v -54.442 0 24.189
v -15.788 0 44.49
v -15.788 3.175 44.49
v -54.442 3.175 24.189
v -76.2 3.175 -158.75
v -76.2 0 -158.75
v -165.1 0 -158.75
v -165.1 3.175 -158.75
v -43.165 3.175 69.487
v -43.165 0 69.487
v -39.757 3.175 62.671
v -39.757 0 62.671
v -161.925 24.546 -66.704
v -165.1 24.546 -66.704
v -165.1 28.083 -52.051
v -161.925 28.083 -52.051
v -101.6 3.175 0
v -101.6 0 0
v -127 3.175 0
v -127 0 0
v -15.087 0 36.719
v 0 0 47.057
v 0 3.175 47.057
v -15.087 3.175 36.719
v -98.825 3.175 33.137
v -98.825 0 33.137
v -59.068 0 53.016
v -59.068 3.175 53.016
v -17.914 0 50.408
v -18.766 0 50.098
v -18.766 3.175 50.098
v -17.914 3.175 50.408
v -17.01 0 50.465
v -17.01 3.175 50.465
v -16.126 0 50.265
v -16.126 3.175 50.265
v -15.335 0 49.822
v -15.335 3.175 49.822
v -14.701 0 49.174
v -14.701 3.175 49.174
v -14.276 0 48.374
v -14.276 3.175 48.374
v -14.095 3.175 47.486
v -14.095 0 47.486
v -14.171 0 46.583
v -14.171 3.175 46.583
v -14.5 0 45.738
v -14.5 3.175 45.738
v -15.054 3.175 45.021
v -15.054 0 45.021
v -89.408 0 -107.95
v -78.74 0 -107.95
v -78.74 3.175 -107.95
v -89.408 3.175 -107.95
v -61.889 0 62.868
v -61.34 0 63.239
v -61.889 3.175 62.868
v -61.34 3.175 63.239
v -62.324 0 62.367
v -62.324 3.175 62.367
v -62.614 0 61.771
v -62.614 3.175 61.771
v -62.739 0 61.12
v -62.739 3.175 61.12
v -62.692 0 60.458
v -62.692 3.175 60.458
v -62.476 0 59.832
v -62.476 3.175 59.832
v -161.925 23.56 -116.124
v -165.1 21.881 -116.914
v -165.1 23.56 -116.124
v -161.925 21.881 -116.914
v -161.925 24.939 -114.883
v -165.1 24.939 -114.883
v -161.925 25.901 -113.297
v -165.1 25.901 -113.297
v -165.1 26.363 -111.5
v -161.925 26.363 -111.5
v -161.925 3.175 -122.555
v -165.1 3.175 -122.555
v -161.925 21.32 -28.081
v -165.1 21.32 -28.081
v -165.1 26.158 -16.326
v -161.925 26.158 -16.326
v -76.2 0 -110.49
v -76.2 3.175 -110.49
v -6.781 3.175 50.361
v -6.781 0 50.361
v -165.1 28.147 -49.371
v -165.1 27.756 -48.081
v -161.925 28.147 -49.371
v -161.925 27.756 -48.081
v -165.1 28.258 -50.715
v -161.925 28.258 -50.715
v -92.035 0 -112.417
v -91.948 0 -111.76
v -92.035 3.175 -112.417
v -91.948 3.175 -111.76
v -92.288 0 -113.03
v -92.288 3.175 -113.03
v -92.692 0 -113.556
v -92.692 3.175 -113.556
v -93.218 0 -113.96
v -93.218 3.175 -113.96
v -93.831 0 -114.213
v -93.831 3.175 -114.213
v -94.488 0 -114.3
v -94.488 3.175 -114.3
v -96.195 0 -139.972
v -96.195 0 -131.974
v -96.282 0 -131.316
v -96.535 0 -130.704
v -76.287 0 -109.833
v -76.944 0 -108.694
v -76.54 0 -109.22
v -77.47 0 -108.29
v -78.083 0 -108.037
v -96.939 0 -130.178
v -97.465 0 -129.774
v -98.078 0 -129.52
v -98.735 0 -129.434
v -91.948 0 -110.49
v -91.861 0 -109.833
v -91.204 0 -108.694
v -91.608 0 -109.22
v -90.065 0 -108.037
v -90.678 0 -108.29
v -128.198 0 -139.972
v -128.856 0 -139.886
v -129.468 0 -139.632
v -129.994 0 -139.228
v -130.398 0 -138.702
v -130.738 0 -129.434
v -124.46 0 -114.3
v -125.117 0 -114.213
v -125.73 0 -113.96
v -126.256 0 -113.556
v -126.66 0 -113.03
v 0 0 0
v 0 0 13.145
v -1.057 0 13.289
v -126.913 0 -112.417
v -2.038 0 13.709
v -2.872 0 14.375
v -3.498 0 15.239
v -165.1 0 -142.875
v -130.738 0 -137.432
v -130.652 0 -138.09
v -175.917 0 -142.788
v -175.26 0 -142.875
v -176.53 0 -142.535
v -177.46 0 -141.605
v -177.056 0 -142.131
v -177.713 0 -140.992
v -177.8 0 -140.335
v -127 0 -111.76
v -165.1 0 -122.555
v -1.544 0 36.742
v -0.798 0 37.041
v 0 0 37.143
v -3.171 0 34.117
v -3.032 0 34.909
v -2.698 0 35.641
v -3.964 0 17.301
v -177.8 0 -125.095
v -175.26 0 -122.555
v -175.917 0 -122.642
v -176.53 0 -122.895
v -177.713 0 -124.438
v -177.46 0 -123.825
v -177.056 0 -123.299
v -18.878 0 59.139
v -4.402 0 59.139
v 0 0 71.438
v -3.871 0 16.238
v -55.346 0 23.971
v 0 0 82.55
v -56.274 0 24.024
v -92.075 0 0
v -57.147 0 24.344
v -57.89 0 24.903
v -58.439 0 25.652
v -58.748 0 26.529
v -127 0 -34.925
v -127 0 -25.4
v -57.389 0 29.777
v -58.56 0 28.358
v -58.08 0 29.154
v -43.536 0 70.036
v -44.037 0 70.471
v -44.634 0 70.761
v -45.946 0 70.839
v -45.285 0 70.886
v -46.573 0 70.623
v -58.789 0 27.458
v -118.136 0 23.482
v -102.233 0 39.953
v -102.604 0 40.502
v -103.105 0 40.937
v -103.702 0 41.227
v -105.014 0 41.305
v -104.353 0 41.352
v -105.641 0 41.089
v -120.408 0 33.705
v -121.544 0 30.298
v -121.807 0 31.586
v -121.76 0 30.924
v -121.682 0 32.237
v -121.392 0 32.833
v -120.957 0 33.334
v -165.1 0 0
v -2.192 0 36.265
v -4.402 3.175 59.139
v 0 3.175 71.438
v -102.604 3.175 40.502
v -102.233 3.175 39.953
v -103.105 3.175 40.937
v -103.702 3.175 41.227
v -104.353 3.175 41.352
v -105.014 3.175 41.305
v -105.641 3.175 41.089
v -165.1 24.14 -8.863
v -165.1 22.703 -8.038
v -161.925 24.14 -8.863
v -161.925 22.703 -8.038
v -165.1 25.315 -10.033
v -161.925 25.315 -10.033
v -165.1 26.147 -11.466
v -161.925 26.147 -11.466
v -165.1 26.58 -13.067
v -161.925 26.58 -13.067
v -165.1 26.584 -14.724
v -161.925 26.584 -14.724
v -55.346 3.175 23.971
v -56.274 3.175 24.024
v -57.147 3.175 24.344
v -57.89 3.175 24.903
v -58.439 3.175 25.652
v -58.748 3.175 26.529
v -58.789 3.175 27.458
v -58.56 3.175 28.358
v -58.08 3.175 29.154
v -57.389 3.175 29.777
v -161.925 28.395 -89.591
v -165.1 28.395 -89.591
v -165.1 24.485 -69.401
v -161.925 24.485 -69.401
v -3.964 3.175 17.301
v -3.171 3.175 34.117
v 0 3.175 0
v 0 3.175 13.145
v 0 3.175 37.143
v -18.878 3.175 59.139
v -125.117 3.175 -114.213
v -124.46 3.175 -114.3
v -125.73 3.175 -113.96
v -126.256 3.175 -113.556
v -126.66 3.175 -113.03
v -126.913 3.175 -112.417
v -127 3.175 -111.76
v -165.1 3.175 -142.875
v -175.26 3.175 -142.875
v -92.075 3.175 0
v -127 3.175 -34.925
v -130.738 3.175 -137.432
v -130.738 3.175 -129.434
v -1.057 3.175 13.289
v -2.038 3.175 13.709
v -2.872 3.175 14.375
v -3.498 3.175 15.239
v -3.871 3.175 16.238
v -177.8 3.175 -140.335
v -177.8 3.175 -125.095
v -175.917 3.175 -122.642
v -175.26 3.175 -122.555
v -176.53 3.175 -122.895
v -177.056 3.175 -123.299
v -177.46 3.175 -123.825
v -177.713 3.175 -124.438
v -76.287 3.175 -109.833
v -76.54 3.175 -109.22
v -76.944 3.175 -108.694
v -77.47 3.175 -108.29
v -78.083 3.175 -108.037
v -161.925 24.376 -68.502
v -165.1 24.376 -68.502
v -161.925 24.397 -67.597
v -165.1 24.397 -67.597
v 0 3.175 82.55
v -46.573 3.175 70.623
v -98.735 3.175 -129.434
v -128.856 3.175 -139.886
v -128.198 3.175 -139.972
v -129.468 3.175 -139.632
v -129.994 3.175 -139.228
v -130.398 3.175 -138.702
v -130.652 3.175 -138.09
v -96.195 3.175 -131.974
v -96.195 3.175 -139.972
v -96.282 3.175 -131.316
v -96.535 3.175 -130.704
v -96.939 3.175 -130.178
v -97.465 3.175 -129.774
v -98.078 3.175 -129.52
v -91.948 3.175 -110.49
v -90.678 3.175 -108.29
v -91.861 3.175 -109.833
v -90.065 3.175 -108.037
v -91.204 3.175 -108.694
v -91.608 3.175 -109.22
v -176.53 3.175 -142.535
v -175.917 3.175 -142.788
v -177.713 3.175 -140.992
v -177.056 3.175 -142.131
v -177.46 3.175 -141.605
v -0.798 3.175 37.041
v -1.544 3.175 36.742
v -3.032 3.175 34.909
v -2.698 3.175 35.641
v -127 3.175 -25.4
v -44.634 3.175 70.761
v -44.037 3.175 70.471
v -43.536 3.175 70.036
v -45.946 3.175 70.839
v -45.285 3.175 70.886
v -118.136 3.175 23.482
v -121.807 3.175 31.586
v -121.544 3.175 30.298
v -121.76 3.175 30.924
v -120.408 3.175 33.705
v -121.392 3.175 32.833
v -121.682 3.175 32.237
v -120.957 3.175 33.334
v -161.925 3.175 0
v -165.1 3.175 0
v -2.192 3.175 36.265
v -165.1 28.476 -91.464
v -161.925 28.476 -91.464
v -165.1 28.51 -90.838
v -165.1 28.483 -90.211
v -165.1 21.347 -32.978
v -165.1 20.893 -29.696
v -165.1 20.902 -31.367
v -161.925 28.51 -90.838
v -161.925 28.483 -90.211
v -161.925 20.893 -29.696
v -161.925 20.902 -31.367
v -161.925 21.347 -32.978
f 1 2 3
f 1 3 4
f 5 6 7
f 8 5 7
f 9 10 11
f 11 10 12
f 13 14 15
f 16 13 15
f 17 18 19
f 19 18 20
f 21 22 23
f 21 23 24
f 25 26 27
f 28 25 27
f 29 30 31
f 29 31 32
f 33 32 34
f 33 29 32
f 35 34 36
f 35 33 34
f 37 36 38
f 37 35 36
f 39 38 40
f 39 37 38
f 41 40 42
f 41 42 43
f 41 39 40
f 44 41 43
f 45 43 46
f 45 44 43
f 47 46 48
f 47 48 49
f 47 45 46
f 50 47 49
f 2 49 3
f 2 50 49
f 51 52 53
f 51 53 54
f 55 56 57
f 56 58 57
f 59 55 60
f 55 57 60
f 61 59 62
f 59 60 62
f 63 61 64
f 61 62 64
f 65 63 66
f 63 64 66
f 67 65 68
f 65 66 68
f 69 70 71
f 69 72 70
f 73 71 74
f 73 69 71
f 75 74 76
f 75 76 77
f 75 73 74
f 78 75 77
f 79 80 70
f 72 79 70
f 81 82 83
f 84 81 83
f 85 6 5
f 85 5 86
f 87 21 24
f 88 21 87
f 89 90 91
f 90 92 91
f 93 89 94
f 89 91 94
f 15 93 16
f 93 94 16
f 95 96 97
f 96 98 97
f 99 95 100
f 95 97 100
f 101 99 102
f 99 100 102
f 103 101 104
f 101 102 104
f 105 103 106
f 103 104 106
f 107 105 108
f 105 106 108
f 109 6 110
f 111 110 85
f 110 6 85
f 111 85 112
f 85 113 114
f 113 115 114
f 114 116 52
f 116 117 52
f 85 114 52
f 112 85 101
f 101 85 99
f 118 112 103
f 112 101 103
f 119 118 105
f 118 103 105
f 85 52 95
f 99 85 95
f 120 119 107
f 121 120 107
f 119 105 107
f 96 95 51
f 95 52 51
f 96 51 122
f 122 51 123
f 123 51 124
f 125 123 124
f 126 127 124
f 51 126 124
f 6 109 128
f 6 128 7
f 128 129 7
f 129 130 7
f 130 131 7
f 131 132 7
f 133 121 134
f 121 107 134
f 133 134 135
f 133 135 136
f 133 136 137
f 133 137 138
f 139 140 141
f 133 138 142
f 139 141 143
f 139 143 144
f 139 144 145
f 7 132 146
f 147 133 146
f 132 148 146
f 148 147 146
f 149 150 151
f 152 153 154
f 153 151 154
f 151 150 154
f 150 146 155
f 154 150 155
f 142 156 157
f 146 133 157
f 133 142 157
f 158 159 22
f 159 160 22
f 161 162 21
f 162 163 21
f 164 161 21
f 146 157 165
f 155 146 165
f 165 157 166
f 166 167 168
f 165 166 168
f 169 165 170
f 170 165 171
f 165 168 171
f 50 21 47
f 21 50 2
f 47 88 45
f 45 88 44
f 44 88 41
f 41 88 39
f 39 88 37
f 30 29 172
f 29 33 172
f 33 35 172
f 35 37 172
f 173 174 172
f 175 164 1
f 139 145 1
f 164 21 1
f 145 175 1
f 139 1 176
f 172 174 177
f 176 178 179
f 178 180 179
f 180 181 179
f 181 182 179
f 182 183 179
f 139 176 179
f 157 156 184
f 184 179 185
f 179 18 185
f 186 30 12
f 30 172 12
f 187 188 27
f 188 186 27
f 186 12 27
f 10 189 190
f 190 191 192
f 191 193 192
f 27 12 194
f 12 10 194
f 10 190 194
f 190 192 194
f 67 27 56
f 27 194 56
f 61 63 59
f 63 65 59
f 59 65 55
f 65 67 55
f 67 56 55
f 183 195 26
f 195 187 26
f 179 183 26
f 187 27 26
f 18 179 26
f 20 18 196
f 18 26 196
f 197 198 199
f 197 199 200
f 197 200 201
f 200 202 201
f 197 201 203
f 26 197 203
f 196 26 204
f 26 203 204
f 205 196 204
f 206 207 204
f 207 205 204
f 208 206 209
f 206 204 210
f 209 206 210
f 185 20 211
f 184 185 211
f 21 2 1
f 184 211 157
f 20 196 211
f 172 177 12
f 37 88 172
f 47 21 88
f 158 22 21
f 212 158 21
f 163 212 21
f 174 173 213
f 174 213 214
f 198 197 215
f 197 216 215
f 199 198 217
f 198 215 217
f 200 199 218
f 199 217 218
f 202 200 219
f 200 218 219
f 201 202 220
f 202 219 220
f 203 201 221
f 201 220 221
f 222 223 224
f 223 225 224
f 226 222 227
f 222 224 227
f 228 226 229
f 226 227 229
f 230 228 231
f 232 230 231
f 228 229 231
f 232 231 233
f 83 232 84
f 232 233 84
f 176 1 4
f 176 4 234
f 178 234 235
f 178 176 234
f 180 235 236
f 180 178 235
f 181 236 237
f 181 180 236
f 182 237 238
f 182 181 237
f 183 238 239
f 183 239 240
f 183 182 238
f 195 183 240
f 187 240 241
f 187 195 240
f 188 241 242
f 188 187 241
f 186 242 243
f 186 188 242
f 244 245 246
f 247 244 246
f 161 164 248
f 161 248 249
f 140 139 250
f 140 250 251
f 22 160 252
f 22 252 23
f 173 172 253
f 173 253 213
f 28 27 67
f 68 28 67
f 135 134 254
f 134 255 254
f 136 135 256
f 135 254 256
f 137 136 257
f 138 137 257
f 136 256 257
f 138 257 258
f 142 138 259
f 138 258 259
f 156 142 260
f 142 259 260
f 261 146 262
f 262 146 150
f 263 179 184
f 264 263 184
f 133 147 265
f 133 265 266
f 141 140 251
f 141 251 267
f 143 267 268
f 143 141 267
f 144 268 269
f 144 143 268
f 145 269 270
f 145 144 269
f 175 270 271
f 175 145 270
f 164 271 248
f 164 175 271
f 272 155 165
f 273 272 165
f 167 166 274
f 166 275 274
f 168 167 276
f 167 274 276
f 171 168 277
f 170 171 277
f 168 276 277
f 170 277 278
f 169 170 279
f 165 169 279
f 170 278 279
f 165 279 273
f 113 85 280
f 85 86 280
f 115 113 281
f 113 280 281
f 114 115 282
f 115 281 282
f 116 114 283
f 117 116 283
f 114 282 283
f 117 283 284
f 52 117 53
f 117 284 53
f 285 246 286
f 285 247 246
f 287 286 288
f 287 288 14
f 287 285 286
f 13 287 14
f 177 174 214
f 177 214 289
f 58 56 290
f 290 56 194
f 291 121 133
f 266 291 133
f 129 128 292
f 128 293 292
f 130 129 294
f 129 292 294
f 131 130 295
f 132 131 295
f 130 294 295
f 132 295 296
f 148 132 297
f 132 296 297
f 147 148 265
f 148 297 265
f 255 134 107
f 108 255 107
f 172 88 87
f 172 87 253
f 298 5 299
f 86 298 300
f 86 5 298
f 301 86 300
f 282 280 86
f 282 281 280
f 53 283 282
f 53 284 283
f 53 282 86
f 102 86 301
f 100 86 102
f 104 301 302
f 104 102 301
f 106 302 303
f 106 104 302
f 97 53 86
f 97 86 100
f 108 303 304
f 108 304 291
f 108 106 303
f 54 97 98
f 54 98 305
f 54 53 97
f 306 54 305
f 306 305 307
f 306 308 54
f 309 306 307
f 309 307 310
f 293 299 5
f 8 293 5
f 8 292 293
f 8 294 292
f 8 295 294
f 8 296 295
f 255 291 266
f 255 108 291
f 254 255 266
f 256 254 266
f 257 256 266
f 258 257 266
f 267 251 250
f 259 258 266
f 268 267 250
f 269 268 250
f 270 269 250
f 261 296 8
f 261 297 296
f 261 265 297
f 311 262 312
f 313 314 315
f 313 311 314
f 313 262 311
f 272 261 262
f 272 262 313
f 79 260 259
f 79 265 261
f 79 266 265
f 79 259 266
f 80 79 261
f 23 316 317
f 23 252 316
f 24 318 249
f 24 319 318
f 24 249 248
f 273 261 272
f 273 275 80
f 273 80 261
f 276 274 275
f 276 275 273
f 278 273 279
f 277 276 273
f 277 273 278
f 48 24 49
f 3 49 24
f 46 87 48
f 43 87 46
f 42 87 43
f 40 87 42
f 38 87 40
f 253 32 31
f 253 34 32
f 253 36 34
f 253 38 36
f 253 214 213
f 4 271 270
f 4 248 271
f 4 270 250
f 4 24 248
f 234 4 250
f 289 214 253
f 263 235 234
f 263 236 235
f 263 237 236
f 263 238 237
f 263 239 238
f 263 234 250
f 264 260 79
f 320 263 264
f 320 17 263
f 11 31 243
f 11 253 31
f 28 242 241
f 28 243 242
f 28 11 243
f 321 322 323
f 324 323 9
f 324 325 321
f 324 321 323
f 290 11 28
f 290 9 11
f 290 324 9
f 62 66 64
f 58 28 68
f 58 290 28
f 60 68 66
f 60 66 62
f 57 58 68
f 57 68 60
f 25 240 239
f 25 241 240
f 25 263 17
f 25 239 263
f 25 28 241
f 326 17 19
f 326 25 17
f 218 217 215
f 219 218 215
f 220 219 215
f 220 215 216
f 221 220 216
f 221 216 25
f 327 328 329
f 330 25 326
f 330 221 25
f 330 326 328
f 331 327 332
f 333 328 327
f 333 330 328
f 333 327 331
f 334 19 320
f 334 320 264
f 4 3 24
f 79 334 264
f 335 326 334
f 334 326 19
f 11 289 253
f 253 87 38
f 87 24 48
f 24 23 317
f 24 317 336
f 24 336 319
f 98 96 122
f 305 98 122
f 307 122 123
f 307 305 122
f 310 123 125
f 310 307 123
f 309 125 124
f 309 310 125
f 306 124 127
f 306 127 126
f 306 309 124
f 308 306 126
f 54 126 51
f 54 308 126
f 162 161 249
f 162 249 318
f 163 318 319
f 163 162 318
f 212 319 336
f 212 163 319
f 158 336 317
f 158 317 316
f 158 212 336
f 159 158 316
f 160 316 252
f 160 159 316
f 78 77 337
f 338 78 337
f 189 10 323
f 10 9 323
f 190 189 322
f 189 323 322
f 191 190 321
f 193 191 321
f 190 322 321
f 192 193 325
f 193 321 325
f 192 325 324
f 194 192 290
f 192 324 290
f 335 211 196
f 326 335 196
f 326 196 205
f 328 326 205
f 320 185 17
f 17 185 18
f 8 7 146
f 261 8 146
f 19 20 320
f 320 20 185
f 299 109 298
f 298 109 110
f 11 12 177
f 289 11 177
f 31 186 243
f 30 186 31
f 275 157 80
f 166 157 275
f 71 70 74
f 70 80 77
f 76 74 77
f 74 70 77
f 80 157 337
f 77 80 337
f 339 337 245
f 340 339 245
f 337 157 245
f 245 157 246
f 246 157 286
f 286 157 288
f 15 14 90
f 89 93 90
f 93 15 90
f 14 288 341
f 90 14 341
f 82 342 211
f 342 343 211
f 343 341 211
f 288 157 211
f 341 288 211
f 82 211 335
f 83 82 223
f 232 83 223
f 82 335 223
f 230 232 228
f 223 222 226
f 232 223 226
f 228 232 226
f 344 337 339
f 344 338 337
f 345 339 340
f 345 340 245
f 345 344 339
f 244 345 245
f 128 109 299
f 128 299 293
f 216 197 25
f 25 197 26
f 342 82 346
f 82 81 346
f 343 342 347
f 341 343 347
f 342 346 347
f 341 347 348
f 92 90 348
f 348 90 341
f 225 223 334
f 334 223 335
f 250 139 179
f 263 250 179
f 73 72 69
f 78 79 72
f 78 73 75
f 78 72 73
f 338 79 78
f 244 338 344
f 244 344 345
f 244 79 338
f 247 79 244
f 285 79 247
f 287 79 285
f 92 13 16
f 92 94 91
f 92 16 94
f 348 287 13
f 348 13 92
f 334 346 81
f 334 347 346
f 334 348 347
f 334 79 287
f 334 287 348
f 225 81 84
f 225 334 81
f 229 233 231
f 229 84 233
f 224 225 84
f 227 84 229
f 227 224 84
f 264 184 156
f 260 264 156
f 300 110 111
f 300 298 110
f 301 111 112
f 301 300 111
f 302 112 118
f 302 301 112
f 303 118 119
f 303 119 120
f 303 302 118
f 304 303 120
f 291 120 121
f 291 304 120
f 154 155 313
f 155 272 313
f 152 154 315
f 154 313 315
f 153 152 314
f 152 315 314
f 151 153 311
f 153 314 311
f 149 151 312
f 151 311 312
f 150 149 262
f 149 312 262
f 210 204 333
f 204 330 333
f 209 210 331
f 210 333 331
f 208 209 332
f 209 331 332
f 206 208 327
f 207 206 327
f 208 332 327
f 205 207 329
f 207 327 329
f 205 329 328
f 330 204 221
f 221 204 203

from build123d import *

# Parameters (mm, degrees)
F1_DEPTH  = 3.175
F2_W      = 15.748
F2_H      = 6.35
F2_W_2    = 12.7
F2_H_2    = 20.32
F3_DEPTH  = 3.175
F4_R      = 2.54
F5_W      = 34.5431789756
F5_H      = 10.5385929346
F6_DEPTH  = 3.176
F8_DEPTH  = 3.175
F9_R      = 6.35
F10_R     = 2.54
F12_W     = 206.8448513746
F12_H     = 268.8337340951
F13_DEPTH = 28.5116125674


with BuildPart() as f1:
    # F0 (on Front) → F1 (new body)
    with BuildSketch(Plane.XZ):
        Polygon((0, 82.55), (0, 0), (127, 0), (127, -114.3), (76.2, -114.3), (76.2, -158.75), (165.1, -158.75), (165.1, 0), align=None)
    extrude(amount=-F1_DEPTH)

    # F2 (on face) → F3 (join, through all)
    with BuildSketch(Plane.XZ):
        Polygon((44.3009787702, 71.7587359406), (39.7572886399, 62.67135568), (59.0679716936, 53.0160141532), (63.6116618239, 62.1033944137), align=None)
        Polygon((122.6796335175, 32.5694085669), (103.3689504639, 42.2247500938), (98.8252603336, 33.1373698332), (118.1359433873, 23.4820283064), align=None)
        with Locations((84.074, -111.125)):
            Rectangle(F2_W, F2_H)
        with Locations((171.45, -132.715)):
            Rectangle(F2_W_2, F2_H_2)
        Polygon((127, -25.4), (101.6, 0), (92.075, 0), (127, -34.925), align=None)
    extrude(amount=-F3_DEPTH)

    # F4
    f4_edges = [f1.edges().sort_by_distance(p)[0] for p in [
        (177.8, 1.5875, -142.875),
        (177.8, 1.5875, -122.555),
        (91.948, 1.5875, -107.95),
        (122.679634, 1.5875, 32.569409),
        (63.611662, 1.5875, 62.103394),
        (103.36895, 1.5875, 42.22475),
        (44.300979, 1.5875, 71.758736),
        (76.2, 1.5875, -107.95),
        (91.948, 1.5875, -114.3),
        (127, 1.5875, -114.3),
    ]]
    fillet(f4_edges, radius=F4_R)

    # F5 (on face) → F6 (cut, through all)
    with BuildSketch(Plane.XZ):
        Polygon((4.4021862559, 59.1385737062), (0, 71.4375), (0, 47.0566861331), (15.08702501, 36.7185198719), (6.7811906338, 50.3608770669), (18.8778863964, 59.1385737062), align=None)
        with BuildLine():
            Line((15.7880578146, 44.4895698524), (54.4423557636, 24.1893212834))
            ThreePointArc((54.4423557636, 24.1893212834), (58.4390000122, 25.6523165849), (57.3894998938, 29.7768856537))
            Line((57.3894998938, 29.7768856537), (18.7659755805, 50.0979274743))
            ThreePointArc((18.7659755805, 50.0979274743), (14.4600820897, 48.7894806012), (15.7880578146, 44.4895698524))
        make_face()
        with BuildLine():
            Line((3.9643459731, 17.3010716776), (3.1714767785, 34.1172288808))
            ThreePointArc((3.1714767785, 34.1172288808), (2.1915586368, 36.2650197343), (0, 37.1426961303))
            Line((0, 37.1426961303), (0, 13.1454057395))
            ThreePointArc((0, 13.1454057395), (2.871654505, 14.3747074435), (3.9643459731, 17.3010716776))
        make_face()
        with Locations((113.4665496647, -134.7029581666)):
            Rectangle(F5_W, F5_H)
    extrude(amount=-F6_DEPTH, mode=Mode.SUBTRACT)

    # F7 (on face) → F8 (join)
    with BuildSketch(Plane.YZ.offset(165.1)):
        Polygon((28.5750000001, -10.4543957859), (3.175, 0), (3.1750000001, -122.555), (25.9204413742, -115.6956553459), (28.5750000001, -90.5212983489), (24.2223335625, -68.0457651615), (28.5750000001, -50.012152642), (20.3100345423, -30.5349558611), align=None)
    extrude(amount=-F8_DEPTH)

    # F9
    f9_edges = [f1.edges().sort_by_distance(p)[0] for p in [
        (163.5125, 28.575, -10.454396),
        (163.5125, 20.310035, -30.534956),
        (163.5125, 28.575, -50.012153),
        (163.5125, 24.222334, -68.045765),
        (163.5125, 28.575, -90.521298),
        (163.5125, 25.920441, -115.695655),
    ]]
    fillet(f9_edges, radius=F9_R)

    # F10
    f10_edges = [f1.edges().sort_by_distance(p)[0] for p in [
        (96.19496, 1.5875, -129.433662),
        (130.738139, 1.5875, -139.972255),
    ]]
    fillet(f10_edges, radius=F10_R)

    # F11: F1 across plane


with BuildPart() as f1_1:
    add(f1.part)
    add(f1.part.mirror(Plane.YZ))

    # F12 (on Front) → F13 (cut, through all)
    with BuildSketch(Plane.XZ):
        with Locations((103.4224256873, -33.929746598)):
            Rectangle(F12_W, F12_H)
    extrude(amount=-F13_DEPTH, mode=Mode.SUBTRACT)


solid = f1_1.part
